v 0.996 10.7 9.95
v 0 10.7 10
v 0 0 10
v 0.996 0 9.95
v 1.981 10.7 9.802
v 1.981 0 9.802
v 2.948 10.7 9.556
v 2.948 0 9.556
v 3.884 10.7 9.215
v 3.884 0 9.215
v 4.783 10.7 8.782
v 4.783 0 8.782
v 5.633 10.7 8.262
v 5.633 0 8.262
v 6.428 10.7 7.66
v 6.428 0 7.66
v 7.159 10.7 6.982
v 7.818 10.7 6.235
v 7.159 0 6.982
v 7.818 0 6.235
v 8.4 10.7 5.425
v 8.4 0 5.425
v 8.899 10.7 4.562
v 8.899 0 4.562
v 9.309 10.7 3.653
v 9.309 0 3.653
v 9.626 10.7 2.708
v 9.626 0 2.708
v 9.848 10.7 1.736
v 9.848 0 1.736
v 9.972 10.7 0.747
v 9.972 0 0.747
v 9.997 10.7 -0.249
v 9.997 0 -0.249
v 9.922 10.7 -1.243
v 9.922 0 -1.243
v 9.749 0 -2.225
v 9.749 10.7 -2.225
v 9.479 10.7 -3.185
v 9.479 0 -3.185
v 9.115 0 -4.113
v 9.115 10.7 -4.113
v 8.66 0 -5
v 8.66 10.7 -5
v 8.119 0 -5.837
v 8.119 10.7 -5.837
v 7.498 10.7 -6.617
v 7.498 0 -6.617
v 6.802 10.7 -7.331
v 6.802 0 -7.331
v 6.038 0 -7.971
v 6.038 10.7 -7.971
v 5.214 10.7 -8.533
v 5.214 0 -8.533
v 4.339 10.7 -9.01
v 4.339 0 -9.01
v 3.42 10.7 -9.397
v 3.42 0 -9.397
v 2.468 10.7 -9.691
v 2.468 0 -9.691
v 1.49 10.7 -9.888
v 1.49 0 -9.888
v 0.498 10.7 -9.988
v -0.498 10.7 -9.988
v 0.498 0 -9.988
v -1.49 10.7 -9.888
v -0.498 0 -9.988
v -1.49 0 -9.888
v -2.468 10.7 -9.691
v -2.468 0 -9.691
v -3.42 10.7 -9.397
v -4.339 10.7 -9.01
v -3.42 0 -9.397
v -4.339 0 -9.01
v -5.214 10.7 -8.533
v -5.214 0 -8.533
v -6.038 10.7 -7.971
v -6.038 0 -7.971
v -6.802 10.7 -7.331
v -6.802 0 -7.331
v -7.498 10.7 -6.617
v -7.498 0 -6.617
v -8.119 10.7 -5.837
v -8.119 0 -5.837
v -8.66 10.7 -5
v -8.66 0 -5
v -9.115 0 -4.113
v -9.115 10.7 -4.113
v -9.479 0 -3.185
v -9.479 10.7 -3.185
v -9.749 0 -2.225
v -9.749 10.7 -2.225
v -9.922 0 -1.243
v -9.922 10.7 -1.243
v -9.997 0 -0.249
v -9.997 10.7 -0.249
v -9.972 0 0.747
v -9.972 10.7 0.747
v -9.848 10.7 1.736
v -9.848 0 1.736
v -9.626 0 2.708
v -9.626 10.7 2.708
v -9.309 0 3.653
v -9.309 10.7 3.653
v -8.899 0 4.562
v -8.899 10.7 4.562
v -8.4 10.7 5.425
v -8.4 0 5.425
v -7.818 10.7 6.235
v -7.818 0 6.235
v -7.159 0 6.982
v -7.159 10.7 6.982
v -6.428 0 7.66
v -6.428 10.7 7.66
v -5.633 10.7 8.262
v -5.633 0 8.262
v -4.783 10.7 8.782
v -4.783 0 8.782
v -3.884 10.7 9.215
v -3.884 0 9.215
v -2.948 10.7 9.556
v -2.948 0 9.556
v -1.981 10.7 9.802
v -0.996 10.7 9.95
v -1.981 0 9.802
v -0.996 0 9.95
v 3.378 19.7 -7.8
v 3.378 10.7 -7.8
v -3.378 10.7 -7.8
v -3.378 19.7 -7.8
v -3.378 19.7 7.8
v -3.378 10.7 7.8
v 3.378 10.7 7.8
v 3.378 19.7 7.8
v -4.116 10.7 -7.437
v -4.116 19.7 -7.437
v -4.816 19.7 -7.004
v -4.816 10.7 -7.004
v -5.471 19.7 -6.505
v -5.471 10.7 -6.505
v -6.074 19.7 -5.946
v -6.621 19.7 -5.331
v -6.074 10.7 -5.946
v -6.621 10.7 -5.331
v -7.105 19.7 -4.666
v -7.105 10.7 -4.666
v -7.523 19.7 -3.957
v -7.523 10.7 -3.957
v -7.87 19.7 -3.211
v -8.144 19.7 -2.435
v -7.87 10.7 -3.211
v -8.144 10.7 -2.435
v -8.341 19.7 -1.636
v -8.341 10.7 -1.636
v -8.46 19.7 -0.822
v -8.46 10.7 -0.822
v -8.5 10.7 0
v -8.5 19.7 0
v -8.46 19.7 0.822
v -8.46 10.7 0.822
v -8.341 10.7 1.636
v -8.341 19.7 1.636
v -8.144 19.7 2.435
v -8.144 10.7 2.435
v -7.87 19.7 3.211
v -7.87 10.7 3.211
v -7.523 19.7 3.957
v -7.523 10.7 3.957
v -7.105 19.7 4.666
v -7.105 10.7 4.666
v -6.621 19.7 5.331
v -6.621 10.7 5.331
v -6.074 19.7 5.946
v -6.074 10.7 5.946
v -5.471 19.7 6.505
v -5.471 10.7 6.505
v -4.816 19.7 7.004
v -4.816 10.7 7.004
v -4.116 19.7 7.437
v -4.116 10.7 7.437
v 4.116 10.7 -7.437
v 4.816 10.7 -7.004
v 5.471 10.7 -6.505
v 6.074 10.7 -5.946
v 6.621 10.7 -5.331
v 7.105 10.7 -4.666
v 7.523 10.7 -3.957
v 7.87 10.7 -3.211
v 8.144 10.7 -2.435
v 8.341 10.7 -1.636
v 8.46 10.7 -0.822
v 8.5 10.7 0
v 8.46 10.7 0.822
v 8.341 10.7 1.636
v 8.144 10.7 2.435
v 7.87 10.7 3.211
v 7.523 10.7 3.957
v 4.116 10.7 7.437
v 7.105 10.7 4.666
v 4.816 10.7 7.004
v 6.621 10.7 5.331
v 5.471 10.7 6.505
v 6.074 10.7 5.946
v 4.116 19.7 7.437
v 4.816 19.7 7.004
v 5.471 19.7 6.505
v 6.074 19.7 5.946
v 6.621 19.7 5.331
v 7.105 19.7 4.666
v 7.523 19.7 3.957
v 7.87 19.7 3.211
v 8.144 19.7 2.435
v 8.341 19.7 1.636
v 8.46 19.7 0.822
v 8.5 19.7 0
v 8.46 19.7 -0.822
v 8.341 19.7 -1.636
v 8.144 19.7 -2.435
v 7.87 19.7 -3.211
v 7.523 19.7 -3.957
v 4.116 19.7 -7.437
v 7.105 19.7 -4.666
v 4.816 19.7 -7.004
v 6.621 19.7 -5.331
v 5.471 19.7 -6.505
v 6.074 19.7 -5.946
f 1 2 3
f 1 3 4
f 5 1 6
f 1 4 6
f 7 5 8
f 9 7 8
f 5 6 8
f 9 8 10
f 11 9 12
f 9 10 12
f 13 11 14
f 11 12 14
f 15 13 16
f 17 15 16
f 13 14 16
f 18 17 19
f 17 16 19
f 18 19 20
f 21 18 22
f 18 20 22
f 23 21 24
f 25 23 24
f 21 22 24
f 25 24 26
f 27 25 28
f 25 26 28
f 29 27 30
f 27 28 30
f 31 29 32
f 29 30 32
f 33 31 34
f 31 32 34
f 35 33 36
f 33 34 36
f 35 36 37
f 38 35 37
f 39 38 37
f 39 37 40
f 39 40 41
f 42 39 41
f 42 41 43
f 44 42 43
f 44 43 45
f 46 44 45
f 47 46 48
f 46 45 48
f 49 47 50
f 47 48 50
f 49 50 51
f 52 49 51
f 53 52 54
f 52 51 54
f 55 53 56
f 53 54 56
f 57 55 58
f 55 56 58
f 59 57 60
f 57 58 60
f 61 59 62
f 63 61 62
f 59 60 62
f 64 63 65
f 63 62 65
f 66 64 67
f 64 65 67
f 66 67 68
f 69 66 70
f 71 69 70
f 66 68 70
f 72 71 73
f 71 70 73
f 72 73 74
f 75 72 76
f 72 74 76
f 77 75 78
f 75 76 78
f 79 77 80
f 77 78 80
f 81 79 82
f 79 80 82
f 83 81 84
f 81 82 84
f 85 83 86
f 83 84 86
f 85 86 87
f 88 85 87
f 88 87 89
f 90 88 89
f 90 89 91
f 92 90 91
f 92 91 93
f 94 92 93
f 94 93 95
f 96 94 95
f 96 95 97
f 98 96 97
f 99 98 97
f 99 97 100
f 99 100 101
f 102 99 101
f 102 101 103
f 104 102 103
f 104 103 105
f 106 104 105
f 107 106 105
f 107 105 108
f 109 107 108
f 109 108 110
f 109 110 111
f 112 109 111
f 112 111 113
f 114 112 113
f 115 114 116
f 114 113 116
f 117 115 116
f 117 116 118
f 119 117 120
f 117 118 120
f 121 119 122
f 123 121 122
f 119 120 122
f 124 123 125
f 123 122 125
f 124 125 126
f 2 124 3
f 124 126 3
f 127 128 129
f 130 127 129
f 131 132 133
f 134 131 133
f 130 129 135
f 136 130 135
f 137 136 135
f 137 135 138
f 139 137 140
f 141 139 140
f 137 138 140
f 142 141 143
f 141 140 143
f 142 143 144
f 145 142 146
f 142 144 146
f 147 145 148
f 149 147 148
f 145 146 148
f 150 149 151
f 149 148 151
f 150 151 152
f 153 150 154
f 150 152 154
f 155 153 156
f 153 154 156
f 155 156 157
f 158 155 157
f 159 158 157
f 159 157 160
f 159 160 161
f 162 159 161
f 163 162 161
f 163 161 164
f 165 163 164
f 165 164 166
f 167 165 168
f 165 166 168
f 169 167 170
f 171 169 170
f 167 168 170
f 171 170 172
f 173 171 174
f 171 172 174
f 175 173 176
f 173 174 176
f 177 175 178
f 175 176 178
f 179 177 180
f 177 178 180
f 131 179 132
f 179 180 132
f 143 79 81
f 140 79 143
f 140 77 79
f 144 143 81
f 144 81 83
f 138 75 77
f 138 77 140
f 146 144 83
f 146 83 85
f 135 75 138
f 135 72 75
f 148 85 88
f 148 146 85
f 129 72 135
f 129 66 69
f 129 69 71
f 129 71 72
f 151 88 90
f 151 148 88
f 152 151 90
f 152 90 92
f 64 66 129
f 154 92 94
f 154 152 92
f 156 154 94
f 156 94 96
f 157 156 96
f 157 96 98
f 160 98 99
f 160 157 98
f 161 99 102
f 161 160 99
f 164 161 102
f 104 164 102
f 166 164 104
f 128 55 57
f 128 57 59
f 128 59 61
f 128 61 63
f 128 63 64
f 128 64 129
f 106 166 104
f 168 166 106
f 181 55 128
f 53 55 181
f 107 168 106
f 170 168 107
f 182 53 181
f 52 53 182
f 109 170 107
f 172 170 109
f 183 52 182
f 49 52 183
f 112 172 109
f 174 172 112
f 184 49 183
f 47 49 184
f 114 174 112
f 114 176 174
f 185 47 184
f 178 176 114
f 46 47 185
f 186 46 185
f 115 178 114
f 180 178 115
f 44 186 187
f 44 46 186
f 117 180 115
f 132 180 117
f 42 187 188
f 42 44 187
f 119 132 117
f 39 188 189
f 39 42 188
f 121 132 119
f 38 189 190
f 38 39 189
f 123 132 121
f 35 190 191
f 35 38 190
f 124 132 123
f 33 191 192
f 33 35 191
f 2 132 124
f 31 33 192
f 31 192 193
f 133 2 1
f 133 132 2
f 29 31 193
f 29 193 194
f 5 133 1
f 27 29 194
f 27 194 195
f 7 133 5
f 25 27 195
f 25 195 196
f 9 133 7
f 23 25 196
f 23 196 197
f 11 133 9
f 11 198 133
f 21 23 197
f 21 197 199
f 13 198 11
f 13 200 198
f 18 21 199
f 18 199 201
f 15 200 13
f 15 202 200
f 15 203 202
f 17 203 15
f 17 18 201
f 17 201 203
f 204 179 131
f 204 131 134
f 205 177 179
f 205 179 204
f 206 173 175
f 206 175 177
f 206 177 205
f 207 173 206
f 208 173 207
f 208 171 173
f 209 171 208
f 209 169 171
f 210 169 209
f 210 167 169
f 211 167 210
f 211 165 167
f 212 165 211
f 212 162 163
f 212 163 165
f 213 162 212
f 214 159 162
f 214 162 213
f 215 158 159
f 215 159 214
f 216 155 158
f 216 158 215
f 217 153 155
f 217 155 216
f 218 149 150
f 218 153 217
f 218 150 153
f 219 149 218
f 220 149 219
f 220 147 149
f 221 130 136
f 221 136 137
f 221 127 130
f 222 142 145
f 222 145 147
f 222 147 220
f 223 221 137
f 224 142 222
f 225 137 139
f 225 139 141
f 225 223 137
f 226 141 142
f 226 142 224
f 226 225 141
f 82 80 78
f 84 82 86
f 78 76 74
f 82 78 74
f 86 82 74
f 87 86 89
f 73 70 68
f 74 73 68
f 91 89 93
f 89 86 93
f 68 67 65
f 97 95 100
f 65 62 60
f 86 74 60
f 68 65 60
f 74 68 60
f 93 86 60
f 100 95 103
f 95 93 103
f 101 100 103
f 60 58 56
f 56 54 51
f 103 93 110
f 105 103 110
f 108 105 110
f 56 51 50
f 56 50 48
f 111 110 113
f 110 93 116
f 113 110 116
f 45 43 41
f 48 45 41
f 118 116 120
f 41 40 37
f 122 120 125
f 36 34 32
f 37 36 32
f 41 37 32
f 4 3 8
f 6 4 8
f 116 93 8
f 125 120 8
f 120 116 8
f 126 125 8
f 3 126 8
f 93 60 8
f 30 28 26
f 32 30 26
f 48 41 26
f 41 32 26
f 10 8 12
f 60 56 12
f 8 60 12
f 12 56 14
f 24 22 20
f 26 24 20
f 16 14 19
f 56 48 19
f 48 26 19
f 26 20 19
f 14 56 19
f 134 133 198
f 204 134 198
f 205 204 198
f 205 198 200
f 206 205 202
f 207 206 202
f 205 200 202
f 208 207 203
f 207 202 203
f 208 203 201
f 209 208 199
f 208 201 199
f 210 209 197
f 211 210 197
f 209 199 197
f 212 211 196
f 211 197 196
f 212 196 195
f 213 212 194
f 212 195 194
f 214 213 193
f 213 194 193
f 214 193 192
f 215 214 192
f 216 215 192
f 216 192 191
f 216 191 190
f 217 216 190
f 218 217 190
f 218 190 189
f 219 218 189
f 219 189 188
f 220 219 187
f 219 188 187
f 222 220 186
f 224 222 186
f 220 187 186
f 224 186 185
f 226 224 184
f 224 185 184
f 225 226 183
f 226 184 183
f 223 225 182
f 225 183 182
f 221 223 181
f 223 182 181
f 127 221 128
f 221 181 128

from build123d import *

# Parameters (mm, degrees)
SKETCH1_R           = 10
BOSS_EXTRUDE1_DEPTH = 10.7
BOSS_EXTRUDE2_DEPTH = 9


with BuildPart() as part:
    # Sketch1 → Boss-Extrude1 (new body)
    with BuildSketch(Plane(origin=(0, 0, 0), x_dir=(1, 0, 0), z_dir=(0, 1, 0))):
        with Locations(Location((0, 0, 0), (0, 0, 270))):
            Circle(SKETCH1_R)
    extrude(amount=BOSS_EXTRUDE1_DEPTH)

    # Sketch2 → Boss-Extrude2 (add)
    with BuildSketch(Plane(origin=(0, 10.7, 0), x_dir=(1, 0, 0), z_dir=(0, 1, 0))):
        with BuildLine():
            ThreePointArc((-3.377869151, 7.8), (-8.5, 0), (-3.377869151, -7.8))
            Line((-3.377869151, -7.8), (3.377869151, -7.8))
            ThreePointArc((3.377869151, -7.8), (8.5, 0), (3.377869151, 7.8))
            Line((3.377869151, 7.8), (-3.377869151, 7.8))
        make_face()
    extrude(amount=BOSS_EXTRUDE2_DEPTH)


solid = part.part
